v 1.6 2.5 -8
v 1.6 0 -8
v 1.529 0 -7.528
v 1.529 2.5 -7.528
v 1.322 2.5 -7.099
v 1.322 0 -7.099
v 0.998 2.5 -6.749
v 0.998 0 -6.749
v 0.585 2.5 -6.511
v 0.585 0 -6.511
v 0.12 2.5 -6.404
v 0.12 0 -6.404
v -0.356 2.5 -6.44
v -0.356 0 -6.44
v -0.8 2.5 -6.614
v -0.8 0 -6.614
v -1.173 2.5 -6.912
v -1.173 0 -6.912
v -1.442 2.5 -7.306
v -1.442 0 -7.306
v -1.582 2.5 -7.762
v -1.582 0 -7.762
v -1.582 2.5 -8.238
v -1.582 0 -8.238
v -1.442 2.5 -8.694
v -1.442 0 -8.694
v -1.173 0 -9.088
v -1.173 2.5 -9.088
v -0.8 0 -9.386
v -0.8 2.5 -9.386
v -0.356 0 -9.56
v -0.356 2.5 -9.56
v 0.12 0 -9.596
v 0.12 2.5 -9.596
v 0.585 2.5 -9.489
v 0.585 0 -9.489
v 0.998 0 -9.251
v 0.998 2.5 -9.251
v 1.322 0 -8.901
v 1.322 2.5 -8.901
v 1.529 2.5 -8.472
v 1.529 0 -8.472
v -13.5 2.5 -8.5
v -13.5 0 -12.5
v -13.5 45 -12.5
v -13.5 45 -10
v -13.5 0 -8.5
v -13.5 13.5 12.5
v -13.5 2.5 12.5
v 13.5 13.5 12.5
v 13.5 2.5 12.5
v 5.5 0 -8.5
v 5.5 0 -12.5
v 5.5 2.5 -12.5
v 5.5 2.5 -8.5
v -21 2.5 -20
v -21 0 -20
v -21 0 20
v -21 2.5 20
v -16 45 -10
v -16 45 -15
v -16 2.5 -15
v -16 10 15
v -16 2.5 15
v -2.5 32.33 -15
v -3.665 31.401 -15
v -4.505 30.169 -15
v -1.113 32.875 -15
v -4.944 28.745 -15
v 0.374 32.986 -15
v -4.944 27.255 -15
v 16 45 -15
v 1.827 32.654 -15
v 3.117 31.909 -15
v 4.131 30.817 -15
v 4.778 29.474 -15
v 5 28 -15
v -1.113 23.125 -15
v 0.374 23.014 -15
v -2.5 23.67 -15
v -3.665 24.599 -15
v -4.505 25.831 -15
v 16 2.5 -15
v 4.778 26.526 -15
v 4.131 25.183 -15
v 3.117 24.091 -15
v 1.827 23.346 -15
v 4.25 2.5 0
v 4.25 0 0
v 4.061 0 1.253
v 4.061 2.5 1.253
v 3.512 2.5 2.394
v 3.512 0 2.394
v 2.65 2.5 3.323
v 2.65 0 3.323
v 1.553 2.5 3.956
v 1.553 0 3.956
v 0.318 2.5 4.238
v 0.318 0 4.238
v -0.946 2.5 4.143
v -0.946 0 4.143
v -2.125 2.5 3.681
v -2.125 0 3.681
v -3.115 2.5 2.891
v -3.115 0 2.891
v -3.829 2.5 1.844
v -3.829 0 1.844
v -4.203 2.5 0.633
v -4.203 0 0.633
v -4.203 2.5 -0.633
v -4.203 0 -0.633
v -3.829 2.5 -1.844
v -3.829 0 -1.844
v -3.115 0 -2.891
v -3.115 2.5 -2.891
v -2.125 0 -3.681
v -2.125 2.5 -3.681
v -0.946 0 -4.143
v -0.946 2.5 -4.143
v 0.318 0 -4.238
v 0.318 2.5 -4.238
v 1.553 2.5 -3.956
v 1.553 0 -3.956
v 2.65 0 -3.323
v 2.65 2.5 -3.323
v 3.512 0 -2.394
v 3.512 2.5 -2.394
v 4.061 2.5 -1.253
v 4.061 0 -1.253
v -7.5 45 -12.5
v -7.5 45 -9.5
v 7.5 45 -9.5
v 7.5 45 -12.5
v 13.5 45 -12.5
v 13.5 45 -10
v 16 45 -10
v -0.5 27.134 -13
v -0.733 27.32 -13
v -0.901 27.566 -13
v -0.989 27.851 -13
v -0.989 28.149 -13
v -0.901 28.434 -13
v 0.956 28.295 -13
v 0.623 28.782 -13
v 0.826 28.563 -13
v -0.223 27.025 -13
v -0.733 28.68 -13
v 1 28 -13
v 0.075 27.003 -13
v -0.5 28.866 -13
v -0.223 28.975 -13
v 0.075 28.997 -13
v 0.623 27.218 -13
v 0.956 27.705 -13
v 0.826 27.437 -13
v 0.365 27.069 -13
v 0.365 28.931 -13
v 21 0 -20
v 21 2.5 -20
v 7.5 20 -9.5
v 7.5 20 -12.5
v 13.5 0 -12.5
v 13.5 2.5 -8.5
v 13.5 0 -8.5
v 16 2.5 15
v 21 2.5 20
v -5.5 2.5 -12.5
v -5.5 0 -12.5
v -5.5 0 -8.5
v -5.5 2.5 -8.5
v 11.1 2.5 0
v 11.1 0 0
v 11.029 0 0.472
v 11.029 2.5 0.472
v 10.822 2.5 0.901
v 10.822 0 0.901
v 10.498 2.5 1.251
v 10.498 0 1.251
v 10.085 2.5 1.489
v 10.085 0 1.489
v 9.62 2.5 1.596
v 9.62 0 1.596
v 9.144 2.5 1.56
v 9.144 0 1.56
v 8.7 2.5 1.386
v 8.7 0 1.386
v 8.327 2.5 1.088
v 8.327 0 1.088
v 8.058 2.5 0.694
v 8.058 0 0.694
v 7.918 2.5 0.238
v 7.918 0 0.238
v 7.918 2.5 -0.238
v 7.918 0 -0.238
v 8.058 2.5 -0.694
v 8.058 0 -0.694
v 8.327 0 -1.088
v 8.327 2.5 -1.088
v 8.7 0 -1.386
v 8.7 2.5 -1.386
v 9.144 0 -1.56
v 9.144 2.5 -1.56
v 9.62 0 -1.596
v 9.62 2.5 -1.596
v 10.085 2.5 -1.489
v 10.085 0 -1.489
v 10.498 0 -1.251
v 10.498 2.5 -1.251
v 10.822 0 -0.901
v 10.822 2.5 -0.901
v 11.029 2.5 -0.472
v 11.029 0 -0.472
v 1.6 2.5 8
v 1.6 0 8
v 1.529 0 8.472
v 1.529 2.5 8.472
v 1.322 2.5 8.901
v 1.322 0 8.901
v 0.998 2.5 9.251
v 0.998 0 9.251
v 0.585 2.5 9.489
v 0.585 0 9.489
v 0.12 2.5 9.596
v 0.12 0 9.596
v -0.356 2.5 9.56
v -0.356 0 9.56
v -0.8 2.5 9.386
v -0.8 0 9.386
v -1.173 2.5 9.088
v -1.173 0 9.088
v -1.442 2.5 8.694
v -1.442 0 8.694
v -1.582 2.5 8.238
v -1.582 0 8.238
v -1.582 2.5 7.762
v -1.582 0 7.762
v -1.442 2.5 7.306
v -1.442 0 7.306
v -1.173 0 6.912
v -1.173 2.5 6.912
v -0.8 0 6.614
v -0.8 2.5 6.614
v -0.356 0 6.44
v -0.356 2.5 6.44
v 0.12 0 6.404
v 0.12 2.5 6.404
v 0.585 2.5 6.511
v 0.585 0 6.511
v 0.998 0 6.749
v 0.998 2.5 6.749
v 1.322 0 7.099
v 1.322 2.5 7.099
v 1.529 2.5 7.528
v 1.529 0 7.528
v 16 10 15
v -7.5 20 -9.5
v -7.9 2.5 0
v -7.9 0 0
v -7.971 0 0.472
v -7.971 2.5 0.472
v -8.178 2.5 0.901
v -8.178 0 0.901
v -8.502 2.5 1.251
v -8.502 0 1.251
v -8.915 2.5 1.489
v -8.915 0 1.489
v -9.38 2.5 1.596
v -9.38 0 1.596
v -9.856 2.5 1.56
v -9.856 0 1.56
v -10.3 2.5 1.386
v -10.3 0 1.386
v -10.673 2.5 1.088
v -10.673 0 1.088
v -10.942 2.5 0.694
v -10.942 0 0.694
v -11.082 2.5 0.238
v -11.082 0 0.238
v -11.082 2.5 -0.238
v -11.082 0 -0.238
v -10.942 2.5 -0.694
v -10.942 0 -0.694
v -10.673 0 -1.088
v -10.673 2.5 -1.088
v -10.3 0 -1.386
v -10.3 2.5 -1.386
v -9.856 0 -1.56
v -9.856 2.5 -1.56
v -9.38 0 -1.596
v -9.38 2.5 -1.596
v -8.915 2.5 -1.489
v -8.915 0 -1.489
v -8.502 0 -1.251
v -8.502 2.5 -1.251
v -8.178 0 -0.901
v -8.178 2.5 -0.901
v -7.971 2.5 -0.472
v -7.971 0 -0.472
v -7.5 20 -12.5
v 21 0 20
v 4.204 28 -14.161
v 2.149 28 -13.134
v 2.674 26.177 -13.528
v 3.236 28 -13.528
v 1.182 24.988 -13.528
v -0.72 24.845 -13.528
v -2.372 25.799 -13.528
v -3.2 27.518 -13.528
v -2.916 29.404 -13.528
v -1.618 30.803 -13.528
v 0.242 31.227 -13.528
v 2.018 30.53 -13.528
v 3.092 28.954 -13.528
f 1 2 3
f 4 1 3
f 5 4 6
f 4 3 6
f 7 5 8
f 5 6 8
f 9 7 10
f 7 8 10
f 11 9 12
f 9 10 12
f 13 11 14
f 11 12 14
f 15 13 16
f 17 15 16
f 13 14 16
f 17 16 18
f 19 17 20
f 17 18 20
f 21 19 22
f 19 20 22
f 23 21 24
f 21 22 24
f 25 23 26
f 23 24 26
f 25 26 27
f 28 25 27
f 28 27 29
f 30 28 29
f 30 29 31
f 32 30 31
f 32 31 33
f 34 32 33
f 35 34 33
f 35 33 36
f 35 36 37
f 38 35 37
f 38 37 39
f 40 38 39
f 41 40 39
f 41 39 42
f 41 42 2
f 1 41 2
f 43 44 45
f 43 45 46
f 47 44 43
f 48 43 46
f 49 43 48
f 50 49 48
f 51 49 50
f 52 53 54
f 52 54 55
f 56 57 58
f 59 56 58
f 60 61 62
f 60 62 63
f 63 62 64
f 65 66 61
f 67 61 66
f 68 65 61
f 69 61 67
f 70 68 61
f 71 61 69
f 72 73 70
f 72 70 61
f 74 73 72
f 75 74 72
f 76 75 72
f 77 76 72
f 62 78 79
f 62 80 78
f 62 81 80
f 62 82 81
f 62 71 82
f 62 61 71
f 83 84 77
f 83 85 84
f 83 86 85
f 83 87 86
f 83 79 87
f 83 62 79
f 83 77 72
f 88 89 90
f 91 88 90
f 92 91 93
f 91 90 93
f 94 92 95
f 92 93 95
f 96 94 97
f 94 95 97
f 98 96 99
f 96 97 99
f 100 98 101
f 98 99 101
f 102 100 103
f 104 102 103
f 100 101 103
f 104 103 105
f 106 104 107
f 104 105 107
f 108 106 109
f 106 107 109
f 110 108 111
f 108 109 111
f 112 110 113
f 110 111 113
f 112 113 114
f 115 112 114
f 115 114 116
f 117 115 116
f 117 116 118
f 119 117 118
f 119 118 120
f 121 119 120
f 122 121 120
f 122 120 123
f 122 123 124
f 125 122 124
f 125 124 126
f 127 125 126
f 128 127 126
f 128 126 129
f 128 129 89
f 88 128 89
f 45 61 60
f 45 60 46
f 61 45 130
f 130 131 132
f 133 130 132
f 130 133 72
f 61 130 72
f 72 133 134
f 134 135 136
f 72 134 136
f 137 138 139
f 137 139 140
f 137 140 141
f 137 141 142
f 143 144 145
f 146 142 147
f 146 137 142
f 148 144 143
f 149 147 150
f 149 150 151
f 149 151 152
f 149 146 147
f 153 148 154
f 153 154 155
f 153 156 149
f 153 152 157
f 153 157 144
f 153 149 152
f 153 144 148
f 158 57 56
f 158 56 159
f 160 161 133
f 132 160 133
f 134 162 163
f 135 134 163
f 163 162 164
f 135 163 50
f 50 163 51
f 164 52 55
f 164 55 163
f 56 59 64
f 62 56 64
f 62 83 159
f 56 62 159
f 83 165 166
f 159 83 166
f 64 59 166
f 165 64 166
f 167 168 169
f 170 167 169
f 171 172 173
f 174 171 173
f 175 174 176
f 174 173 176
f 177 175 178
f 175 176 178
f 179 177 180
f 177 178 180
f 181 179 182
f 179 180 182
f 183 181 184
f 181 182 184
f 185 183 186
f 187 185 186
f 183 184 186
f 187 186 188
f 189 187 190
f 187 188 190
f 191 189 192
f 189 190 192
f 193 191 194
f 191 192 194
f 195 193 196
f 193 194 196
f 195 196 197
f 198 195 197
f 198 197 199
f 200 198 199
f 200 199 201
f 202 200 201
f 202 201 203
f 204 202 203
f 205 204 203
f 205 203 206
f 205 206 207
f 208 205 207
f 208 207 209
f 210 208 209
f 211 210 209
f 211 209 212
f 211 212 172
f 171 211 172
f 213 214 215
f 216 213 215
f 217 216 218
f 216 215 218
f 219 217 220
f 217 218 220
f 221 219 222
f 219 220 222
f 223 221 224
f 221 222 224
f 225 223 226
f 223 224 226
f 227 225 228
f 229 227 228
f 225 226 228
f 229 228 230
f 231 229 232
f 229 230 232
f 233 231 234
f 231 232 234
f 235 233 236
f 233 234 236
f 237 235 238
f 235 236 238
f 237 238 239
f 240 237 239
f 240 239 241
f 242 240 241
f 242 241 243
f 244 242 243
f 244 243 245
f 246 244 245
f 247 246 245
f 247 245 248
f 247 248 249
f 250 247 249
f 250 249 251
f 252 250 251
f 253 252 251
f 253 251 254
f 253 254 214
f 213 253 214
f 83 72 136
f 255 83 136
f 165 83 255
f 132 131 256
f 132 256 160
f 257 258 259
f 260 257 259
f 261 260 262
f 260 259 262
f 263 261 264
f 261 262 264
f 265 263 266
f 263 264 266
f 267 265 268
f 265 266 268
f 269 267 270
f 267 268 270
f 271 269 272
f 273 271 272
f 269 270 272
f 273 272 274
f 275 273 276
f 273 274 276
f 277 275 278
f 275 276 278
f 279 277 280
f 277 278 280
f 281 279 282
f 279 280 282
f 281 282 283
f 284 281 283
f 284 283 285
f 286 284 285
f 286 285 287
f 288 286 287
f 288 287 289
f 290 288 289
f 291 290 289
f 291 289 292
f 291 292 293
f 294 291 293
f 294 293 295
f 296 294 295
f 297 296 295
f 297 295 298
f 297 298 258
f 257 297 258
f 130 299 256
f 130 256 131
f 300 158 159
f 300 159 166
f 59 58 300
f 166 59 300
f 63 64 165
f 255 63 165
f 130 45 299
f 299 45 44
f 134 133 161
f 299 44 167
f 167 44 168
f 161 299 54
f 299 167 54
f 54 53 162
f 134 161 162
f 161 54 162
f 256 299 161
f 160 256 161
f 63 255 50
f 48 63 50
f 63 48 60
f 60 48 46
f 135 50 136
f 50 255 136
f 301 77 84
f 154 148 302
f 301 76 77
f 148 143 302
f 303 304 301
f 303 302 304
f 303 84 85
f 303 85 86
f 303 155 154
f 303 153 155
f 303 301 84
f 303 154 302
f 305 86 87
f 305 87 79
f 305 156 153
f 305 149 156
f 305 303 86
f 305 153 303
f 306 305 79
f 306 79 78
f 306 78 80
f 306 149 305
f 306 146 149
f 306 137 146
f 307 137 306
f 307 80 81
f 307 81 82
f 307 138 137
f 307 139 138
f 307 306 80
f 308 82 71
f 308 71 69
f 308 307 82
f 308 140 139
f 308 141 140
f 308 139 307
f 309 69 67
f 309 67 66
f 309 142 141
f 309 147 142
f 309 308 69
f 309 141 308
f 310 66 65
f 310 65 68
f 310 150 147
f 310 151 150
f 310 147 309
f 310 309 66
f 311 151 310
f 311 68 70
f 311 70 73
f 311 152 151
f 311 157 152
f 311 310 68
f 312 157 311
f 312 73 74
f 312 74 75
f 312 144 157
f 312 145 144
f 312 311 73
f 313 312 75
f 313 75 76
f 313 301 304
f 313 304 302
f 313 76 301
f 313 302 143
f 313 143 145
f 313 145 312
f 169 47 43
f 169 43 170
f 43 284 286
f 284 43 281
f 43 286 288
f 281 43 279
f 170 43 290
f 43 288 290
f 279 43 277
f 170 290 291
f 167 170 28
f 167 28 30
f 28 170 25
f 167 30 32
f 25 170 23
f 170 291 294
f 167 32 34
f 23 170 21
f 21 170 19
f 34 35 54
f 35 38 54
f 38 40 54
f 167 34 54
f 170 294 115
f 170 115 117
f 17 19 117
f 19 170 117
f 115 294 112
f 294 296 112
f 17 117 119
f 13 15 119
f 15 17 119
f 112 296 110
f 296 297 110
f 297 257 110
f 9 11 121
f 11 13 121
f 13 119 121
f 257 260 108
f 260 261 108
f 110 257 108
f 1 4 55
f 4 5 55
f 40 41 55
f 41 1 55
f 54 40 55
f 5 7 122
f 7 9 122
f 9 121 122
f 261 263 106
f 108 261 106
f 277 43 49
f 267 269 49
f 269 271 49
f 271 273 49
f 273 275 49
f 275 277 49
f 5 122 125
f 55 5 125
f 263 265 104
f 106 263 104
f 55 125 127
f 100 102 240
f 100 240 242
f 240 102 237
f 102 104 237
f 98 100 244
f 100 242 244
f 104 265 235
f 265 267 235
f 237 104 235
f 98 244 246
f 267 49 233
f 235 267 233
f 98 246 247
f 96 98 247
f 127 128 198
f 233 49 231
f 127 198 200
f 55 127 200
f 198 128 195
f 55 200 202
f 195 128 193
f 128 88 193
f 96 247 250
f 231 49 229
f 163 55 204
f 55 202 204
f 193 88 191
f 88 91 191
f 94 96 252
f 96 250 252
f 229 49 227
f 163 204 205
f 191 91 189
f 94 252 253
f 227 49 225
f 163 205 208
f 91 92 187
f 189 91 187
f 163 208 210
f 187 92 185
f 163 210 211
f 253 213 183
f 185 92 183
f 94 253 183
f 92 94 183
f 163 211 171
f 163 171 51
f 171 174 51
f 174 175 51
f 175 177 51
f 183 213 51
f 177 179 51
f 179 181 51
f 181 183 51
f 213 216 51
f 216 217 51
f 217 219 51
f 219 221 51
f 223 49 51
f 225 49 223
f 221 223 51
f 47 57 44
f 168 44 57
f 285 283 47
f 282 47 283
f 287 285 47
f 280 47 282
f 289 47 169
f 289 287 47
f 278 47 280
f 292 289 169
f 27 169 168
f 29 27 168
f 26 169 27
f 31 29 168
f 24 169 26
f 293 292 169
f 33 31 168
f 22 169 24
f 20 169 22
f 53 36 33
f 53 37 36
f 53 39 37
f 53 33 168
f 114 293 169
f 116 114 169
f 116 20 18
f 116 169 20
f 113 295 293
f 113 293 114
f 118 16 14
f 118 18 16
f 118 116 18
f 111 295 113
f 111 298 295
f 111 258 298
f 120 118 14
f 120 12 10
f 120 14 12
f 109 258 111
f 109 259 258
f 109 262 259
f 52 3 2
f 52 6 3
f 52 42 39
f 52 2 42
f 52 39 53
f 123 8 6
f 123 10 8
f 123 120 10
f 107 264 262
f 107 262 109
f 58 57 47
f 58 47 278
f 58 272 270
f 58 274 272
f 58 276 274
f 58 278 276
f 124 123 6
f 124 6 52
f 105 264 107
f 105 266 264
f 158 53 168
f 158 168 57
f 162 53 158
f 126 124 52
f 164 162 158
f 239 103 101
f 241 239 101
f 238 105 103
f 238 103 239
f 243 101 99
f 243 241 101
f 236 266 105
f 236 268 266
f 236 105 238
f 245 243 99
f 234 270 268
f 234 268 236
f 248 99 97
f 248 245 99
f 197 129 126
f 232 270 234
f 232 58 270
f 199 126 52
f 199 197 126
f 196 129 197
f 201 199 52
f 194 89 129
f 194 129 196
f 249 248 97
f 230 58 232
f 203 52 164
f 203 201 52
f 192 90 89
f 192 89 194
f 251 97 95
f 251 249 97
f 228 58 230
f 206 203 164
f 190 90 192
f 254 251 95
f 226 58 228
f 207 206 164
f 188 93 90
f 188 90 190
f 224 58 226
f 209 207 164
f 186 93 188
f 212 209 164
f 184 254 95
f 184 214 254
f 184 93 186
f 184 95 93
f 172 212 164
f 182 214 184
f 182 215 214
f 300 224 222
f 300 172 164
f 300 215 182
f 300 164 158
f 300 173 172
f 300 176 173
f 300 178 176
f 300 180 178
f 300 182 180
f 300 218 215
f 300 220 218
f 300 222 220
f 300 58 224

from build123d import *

# Parameters (mm, degrees)
F0_W      = 32
F0_H      = 30
F1_DEPTH  = 45
F2_T      = -2.5
F4_DEPTH  = 32.001
F5_W      = 42
F5_H      = 40
F6_DEPTH  = 2.5
F7_R      = 1.6
F7_R_2    = 4.25
F7_W      = 8
F7_H      = 4
F8_DEPTH  = 45.001
F9_W      = 15
F9_H      = 25
F10_DEPTH = 3
F11_R     = 5
F12_DEPTH = 2


# Not quite as in the source:
# - a fillet or chamfer that OpenCascade refuses, or shapes differently, is made with other operations: its cross-section is extruded or revolved along the edge and cut away or added


with BuildPart() as f1:
    # F0 (on Front) → F1 (new body)
    with BuildSketch(Plane.XZ):
        Rectangle(F0_W, F0_H)
    extrude(amount=-F1_DEPTH)

    # F2
    f2_openings = [f1.faces().sort_by_distance(p)[0] for p in [
        (0, 45, 0),
    ]]
    offset(amount=F2_T, openings=f2_openings)

    # F3 (on face) → F4 (cut, through all)
    with BuildSketch(Plane.YZ.offset(16)):
        Polygon((45, 15), (10, 15), (45, -10), align=None)
    extrude(amount=-F4_DEPTH, mode=Mode.SUBTRACT)

    # F5 (on face) → F6 (join)
    with BuildSketch(Plane.XZ):
        Rectangle(F5_W, F5_H)
    extrude(amount=-F6_DEPTH)

    # F7 (on face) → F8 (cut, through all)
    with BuildSketch(Plane.XZ):
        with Locations((9.5, 0)):
            Circle(F7_R)
        with Locations((-9.5, 0)):
            Circle(F7_R)
        with Locations((0, -8)):
            Circle(F7_R)
        with Locations((0, 8)):
            Circle(F7_R)
        Circle(F7_R_2)
        with Locations((9.5, -10.5)):
            Rectangle(F7_W, F7_H)
        with Locations((-9.5, -10.5)):
            Rectangle(F7_W, F7_H)
    extrude(amount=-F8_DEPTH, mode=Mode.SUBTRACT)

    # F9 (on face) → F10 (join)
    with BuildSketch(Plane.XY.offset(-12.5)):
        with Locations((0, 32.5)):
            Rectangle(F9_W, F9_H)
    extrude(amount=F10_DEPTH)

    # F11 (on face) → F12 (cut)
    with BuildSketch(Plane(origin=(0, 0, -15), x_dir=(1, 0, 0), z_dir=(0, 0, -1))):
        with Locations((0, -28)):
            Circle(F11_R)
    extrude(amount=-F12_DEPTH, mode=Mode.SUBTRACT)

    # F13: fillet of radius 5 on 1 edges, made by hand

    # F13_s1 → F13_t2 (revolve)
    with BuildSketch(Plane.XZ.offset(-28)):
        with BuildLine():
            ThreePointArc((5, -15), (3.2360679775, -13.527864045), (1, -13))
            Line((1, -13), (5, -13))
            Line((5, -13), (5, -15))
        make_face()
    revolve(axis=Axis((0, 28, -13), (0, 0, -1)))


solid = f1.part
